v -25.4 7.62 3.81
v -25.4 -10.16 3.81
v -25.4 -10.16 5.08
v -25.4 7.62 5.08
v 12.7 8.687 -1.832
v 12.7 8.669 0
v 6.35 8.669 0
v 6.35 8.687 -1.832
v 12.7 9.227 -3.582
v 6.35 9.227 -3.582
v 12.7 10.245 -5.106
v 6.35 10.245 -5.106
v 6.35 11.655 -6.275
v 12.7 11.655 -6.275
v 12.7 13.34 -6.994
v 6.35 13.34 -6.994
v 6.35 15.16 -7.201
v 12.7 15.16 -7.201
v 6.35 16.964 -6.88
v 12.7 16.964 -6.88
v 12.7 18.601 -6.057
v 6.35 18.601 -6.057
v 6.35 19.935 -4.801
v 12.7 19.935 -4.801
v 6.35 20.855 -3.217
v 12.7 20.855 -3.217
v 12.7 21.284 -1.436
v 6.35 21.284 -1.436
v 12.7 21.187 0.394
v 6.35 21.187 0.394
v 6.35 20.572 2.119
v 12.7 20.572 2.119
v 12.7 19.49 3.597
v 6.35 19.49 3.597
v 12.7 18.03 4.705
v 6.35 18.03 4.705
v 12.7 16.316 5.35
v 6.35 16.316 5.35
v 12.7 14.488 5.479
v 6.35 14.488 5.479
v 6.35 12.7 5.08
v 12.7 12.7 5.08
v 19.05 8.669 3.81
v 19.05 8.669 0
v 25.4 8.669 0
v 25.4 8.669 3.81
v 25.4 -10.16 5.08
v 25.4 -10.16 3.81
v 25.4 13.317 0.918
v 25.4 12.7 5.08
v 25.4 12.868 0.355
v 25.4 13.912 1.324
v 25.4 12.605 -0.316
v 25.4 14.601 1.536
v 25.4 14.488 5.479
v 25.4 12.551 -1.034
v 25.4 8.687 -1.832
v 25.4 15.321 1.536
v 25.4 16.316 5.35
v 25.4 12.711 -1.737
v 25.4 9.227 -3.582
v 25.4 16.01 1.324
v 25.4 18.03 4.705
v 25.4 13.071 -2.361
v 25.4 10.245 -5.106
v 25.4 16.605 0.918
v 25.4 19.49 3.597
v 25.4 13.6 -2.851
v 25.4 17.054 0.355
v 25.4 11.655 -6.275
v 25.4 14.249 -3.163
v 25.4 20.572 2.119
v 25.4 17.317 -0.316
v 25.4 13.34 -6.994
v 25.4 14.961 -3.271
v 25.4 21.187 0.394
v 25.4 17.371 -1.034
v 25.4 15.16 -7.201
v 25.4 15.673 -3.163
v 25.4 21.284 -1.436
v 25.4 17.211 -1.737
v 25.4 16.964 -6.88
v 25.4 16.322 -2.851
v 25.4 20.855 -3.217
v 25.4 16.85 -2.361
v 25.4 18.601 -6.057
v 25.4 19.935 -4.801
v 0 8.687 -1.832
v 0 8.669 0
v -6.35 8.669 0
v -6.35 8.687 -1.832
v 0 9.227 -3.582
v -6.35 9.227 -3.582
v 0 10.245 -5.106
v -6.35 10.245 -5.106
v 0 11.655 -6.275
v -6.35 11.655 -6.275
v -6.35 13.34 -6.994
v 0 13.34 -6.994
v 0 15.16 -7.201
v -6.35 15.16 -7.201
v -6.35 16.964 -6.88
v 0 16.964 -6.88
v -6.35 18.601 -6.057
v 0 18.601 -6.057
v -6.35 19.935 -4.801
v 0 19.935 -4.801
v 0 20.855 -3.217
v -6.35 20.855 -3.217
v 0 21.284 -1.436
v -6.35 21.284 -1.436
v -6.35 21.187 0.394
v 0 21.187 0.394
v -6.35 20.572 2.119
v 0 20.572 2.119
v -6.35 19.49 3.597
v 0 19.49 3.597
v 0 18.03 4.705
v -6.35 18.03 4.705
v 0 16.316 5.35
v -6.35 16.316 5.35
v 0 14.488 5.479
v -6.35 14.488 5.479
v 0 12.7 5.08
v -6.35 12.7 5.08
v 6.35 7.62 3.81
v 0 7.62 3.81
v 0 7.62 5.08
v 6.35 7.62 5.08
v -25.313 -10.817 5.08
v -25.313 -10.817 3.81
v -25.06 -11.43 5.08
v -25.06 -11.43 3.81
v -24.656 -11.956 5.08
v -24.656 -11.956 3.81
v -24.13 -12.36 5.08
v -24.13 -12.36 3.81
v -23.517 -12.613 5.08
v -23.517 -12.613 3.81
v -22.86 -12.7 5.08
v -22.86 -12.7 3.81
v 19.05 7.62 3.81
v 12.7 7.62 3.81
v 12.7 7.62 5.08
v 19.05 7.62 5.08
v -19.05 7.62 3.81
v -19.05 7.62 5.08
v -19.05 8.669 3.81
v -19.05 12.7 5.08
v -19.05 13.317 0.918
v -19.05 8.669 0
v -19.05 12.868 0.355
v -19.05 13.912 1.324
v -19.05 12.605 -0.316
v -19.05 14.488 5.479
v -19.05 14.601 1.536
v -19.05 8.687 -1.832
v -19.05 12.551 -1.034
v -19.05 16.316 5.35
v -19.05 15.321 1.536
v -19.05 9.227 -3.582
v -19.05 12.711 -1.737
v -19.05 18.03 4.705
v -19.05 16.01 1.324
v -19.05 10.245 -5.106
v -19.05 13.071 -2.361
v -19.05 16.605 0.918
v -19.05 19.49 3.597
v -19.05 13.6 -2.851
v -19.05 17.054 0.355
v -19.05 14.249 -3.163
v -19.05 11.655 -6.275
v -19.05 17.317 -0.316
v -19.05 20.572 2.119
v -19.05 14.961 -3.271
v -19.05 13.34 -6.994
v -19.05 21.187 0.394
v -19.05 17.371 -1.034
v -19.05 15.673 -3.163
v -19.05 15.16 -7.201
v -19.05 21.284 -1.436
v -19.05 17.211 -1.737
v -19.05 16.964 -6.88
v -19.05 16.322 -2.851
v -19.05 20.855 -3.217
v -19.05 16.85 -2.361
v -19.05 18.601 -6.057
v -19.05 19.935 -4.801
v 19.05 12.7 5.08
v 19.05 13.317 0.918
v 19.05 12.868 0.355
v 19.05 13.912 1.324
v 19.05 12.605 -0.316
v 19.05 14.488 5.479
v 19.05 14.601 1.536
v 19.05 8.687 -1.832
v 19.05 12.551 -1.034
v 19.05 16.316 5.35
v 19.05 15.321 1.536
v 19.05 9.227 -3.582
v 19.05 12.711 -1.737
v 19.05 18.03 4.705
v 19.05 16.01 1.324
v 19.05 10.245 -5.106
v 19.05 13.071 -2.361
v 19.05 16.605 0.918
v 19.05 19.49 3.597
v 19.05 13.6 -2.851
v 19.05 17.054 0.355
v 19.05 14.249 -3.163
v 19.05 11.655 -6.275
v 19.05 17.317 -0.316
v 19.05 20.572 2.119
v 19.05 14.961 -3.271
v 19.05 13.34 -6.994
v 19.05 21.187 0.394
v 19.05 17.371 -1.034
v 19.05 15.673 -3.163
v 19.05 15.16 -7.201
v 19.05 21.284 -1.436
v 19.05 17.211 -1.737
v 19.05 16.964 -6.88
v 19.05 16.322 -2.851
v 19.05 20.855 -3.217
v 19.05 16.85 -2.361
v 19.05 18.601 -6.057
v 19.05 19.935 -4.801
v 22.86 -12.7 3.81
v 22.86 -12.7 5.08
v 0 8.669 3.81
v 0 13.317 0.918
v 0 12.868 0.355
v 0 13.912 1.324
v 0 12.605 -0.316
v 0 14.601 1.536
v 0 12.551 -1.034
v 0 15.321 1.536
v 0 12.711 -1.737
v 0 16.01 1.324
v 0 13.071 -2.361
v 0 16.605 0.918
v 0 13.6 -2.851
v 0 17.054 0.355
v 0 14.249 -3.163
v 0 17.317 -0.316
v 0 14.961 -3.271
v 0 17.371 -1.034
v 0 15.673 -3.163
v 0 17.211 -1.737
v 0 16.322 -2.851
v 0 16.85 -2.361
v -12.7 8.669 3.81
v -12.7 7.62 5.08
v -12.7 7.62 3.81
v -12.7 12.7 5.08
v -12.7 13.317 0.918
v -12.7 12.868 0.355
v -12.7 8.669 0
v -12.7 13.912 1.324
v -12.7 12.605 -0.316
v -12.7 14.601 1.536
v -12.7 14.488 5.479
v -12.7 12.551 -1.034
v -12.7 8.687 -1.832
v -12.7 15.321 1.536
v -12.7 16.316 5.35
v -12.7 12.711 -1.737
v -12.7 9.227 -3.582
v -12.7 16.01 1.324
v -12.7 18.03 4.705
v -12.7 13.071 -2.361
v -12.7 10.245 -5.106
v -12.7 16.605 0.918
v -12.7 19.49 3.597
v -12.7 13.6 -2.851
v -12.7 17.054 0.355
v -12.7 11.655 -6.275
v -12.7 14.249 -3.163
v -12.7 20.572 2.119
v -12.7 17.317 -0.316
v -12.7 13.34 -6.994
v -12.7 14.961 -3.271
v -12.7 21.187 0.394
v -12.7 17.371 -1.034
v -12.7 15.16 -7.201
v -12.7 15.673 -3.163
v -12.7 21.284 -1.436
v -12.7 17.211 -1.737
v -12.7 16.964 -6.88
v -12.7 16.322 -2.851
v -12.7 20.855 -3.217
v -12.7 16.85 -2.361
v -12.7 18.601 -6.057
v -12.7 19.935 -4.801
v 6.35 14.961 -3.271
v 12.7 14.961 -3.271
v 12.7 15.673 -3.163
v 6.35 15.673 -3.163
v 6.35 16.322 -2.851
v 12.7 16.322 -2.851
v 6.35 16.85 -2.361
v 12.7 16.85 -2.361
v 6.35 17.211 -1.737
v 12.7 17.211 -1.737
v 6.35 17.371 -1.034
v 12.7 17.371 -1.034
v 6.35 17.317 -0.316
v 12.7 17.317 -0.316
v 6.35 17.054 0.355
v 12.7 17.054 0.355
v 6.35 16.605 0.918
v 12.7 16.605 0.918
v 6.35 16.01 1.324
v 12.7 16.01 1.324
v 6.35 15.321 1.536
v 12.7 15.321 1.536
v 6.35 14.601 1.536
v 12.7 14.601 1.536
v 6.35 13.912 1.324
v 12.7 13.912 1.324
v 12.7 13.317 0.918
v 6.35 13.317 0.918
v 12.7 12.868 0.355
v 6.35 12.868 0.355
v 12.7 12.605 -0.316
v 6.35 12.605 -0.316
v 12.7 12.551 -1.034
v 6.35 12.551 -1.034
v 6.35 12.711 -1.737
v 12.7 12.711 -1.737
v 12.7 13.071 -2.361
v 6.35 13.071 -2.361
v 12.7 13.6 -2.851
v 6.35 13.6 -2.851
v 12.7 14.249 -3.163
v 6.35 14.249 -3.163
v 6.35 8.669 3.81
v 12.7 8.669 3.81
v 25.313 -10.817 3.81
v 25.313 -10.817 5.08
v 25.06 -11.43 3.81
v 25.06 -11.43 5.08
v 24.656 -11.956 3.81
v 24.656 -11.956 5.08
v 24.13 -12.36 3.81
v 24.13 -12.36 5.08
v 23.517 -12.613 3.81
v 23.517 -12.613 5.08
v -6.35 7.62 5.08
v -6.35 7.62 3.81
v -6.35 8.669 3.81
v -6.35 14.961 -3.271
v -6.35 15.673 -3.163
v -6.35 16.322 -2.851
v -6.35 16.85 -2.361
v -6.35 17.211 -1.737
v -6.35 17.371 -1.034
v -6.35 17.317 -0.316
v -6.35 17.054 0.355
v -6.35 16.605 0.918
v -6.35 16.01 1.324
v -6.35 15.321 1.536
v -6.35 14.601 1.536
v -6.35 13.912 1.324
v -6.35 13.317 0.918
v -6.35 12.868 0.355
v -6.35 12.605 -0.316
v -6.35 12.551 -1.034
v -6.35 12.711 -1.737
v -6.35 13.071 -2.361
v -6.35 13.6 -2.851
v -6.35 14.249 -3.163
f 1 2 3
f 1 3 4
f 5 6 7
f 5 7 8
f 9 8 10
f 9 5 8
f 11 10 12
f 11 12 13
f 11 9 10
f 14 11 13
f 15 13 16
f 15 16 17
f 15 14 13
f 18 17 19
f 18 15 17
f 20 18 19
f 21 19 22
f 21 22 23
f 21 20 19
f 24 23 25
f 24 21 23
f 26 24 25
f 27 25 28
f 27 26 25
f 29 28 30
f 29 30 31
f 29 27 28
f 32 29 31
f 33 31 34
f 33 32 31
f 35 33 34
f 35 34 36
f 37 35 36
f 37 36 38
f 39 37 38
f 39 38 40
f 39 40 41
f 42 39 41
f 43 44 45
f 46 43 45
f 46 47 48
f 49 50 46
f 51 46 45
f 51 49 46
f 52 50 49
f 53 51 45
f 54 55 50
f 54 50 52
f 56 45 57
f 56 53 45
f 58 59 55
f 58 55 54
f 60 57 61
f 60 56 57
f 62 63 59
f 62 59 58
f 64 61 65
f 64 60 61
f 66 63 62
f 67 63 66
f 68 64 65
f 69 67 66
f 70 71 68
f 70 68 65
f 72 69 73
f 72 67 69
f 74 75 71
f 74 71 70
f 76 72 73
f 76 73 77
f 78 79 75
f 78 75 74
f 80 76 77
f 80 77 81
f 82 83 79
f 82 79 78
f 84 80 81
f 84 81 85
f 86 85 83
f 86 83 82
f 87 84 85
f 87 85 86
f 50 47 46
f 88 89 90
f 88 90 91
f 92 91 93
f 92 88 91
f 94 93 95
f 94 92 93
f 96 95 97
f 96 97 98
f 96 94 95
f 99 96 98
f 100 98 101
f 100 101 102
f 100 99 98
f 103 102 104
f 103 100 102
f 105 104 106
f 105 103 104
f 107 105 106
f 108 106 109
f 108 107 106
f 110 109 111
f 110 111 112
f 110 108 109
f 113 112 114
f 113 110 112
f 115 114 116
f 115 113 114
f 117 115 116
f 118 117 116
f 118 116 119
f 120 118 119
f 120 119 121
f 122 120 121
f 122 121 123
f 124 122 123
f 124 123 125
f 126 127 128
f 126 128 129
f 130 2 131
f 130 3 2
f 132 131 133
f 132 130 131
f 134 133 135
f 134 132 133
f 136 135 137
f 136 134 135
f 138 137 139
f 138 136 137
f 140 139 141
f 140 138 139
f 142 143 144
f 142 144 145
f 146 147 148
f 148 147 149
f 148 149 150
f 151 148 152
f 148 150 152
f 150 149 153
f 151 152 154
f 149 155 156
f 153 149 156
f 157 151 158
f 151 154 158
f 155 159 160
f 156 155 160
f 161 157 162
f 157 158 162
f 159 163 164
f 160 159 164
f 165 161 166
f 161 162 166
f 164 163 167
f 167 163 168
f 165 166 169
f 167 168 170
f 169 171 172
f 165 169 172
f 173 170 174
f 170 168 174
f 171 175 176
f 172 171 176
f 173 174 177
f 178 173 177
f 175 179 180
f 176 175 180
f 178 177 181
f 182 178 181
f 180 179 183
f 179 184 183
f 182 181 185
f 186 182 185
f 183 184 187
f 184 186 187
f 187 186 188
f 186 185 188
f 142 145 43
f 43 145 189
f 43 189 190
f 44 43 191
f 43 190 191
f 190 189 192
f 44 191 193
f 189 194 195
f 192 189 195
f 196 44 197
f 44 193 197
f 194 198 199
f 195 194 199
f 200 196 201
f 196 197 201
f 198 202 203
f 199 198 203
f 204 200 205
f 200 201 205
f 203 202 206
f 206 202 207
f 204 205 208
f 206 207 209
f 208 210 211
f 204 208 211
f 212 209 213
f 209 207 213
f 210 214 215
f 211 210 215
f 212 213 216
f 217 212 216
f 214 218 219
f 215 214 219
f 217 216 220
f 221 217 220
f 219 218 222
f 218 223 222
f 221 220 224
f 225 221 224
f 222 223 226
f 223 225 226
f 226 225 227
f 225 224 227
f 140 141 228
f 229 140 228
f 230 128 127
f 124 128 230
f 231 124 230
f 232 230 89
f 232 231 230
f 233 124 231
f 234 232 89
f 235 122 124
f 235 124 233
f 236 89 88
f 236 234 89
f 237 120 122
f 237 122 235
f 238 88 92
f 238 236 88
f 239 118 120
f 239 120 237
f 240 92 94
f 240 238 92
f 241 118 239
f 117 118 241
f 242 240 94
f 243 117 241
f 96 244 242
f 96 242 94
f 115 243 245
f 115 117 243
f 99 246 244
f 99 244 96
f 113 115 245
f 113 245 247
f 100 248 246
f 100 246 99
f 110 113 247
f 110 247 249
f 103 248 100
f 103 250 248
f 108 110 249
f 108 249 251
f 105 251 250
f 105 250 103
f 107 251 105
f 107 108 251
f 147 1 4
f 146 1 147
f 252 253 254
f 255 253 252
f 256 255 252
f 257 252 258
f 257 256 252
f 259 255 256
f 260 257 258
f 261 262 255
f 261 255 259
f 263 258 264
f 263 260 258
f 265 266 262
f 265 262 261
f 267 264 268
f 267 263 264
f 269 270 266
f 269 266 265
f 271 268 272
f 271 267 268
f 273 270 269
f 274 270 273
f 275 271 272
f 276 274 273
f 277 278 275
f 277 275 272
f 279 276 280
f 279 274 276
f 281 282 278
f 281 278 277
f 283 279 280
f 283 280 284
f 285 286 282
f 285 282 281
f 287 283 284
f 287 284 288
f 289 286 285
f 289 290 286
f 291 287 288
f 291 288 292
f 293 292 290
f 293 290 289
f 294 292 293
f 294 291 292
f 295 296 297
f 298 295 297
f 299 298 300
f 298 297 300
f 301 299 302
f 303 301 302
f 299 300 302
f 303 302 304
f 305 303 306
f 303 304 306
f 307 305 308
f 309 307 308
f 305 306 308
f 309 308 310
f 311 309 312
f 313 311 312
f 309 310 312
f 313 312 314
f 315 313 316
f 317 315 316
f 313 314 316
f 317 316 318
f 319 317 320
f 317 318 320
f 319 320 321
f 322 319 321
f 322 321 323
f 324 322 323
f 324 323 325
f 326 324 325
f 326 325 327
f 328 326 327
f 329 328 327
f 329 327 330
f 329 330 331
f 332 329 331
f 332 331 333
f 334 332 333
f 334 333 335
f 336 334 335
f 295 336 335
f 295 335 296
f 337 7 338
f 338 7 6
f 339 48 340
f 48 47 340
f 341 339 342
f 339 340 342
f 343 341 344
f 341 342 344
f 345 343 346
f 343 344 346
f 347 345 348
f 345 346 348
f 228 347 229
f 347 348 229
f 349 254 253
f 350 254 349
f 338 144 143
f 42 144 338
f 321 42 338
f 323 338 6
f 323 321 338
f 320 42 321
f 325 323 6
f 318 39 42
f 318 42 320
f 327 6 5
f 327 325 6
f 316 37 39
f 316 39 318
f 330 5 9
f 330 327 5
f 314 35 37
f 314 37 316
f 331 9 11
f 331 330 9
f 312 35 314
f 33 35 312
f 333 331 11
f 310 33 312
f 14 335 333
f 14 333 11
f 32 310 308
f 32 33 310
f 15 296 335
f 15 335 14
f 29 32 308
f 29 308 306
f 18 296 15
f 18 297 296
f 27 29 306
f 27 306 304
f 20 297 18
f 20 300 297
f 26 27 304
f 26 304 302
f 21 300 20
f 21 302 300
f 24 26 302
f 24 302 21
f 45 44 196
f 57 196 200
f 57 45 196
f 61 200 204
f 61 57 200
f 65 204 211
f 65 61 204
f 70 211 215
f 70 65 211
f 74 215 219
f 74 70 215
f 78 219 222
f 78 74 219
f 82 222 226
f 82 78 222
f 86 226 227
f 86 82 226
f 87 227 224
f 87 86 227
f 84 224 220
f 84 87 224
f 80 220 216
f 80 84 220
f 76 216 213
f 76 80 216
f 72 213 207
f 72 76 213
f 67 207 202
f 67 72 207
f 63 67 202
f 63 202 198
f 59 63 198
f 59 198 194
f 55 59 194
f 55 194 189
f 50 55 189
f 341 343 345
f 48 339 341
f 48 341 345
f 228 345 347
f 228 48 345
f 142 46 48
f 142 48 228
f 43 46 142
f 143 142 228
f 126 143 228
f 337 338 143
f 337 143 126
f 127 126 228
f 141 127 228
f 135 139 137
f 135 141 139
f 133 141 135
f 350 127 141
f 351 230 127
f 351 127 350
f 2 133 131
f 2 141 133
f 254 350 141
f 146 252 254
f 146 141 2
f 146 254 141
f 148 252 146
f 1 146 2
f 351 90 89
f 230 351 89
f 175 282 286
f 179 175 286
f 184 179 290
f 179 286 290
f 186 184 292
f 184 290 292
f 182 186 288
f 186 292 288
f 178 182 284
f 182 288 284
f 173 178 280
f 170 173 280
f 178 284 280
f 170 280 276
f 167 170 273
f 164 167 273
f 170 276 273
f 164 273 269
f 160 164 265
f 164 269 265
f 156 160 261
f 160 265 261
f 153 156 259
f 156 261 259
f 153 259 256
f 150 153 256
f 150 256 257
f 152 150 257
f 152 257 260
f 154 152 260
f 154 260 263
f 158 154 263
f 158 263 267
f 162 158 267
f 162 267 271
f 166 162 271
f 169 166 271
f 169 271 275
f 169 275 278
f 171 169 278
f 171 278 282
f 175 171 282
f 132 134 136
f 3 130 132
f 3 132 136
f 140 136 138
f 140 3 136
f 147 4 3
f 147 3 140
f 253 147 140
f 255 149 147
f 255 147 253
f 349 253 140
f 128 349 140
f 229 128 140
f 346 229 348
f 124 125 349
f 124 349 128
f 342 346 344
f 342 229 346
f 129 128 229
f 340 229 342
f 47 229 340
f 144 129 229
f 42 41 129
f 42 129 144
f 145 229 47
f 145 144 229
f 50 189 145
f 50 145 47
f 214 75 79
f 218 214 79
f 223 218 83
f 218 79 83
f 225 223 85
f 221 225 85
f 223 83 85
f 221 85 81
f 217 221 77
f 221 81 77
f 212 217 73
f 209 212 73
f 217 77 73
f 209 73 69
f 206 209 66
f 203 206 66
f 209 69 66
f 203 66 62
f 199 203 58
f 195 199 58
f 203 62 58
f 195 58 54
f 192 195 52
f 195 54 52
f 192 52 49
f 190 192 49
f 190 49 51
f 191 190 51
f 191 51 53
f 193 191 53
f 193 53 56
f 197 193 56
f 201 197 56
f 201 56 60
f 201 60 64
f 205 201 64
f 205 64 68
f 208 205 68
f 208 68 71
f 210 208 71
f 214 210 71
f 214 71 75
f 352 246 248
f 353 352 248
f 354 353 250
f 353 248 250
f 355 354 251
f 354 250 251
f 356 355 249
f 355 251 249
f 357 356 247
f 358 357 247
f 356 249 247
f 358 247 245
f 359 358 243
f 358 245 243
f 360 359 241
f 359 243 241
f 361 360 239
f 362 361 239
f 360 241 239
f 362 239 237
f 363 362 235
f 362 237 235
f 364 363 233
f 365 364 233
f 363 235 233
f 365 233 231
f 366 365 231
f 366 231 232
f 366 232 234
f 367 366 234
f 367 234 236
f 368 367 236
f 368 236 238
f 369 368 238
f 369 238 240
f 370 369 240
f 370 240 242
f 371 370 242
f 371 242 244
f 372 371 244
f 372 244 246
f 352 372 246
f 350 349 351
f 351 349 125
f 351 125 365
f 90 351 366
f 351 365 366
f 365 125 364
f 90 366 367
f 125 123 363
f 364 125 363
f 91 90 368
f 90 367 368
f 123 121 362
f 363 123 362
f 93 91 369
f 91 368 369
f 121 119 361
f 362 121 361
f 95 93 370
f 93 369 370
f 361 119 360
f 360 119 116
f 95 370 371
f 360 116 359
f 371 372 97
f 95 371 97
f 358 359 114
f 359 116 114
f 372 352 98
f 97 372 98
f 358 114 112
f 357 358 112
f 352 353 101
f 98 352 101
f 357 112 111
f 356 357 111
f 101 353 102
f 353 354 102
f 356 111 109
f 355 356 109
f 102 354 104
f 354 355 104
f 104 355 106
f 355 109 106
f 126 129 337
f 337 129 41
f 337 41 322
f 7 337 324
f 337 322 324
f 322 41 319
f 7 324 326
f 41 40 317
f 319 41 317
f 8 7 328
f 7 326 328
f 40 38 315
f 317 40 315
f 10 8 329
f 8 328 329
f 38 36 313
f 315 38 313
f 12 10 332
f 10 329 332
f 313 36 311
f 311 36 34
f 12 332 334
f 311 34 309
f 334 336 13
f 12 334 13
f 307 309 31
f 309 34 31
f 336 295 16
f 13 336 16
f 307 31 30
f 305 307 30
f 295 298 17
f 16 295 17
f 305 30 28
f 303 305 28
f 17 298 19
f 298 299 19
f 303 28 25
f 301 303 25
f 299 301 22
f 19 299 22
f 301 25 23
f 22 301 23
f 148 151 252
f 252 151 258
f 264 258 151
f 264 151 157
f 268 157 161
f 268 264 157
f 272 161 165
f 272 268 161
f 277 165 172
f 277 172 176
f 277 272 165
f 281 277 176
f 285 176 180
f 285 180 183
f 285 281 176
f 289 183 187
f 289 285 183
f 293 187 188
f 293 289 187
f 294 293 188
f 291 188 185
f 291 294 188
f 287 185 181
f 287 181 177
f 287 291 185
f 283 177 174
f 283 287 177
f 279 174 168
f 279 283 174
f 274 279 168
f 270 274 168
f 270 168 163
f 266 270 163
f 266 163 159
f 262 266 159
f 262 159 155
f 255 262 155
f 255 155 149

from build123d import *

# Parameters (mm, degrees)
SKETCH1_W           = 50.8
SKETCH1_H           = 25.4
BOSS_EXTRUDE1_DEPTH = 5.08
SKETCH2_R           = 6.35
BOSS_EXTRUDE5_DEPTH = 6.35
LPATTERN2_COUNT     = 4
LPATTERN2_PITCH     = 12.7
SKETCH7_W           = 6.35
SKETCH7_H           = 5.08
CUT_EXTRUDE2_DEPTH  = 5.08
CUT_EXTRUDE3_DEPTH  = 3.81
FILLET1_R           = 2.54
SKETCH2_5_R         = 2.416788658
CUT_EXTRUDE6_DEPTH  = 76.2


with BuildPart() as part:
    # Sketch1 → Boss-Extrude1 (new body)
    with BuildSketch(Plane.XY):
        Rectangle(SKETCH1_W, SKETCH1_H)
    extrude(amount=BOSS_EXTRUDE1_DEPTH)

    # Sketch2 → Boss-Extrude5 (add)
    with BuildSketch(Plane(origin=(25.4, 0, 0), x_dir=(0, 0, -1), z_dir=(1, 0, 0))):
        with Locations((0.853861474, 14.960926359)):
            Circle(SKETCH2_R)
    boss_extrude5 = extrude(amount=-BOSS_EXTRUDE5_DEPTH)

    # LPattern2: Boss-Extrude5 ×4
    with Locations(*[(-i * LPATTERN2_PITCH, 0, 0) for i in range(1, LPATTERN2_COUNT)]):
        add(boss_extrude5)

    # Sketch7 → Cut-Extrude2 (cut)
    with BuildSketch(Plane(origin=(0, 12.7, 0), x_dir=(1, 0, 0), z_dir=(0, 1, 0))):
        with Locations((15.875, -2.54)):
            Rectangle(SKETCH7_W, SKETCH7_H)
        with Locations((3.175, -2.54)):
            Rectangle(SKETCH7_W, SKETCH7_H)
        with Locations((-9.525, -2.54)):
            Rectangle(SKETCH7_W, SKETCH7_H)
        with Locations((-22.225, -2.54)):
            Rectangle(SKETCH7_W, SKETCH7_H)
    extrude(amount=-CUT_EXTRUDE2_DEPTH, mode=Mode.SUBTRACT)

    # Sketch8 → Cut-Extrude3 (cut)
    with BuildSketch(Plane(origin=(0, 0, 0), x_dir=(-1, 0, 0), z_dir=(0, 0, -1))):
        Polygon((-19.05, 7.62), (-19.05, 8.668596061), (-25.4, 8.668596061), (-25.4, -12.7), (25.4, -12.7), (25.4, 7.62), (19.05, 7.62), (19.05, 8.668596061), (12.7, 8.668596061), (12.7, 7.62), (6.35, 7.62), (6.35, 8.668596061), (0, 8.668596061), (0, 7.62), (-6.35, 7.62), (-6.35, 8.668596061), (-12.7, 8.668596061), (-12.7, 7.62), align=None)
    extrude(amount=-CUT_EXTRUDE3_DEPTH, mode=Mode.SUBTRACT)

    # Fillet1
    fillet1_edges = [part.edges().sort_by_distance(p)[0] for p in [
        (25.4, -12.7, 4.445),
        (-25.4, -12.7, 4.445),
    ]]
    fillet(fillet1_edges, radius=FILLET1_R)

    # Sketch2<5> → Cut-Extrude6 (cut)
    with BuildSketch(Plane(origin=(25.4, 0, 0), x_dir=(0, 0, -1), z_dir=(1, 0, 0))):
        with Locations((0.853861474, 14.960926359)):
            Circle(SKETCH2_5_R)
    extrude(amount=-CUT_EXTRUDE6_DEPTH, mode=Mode.SUBTRACT)


solid = part.part
